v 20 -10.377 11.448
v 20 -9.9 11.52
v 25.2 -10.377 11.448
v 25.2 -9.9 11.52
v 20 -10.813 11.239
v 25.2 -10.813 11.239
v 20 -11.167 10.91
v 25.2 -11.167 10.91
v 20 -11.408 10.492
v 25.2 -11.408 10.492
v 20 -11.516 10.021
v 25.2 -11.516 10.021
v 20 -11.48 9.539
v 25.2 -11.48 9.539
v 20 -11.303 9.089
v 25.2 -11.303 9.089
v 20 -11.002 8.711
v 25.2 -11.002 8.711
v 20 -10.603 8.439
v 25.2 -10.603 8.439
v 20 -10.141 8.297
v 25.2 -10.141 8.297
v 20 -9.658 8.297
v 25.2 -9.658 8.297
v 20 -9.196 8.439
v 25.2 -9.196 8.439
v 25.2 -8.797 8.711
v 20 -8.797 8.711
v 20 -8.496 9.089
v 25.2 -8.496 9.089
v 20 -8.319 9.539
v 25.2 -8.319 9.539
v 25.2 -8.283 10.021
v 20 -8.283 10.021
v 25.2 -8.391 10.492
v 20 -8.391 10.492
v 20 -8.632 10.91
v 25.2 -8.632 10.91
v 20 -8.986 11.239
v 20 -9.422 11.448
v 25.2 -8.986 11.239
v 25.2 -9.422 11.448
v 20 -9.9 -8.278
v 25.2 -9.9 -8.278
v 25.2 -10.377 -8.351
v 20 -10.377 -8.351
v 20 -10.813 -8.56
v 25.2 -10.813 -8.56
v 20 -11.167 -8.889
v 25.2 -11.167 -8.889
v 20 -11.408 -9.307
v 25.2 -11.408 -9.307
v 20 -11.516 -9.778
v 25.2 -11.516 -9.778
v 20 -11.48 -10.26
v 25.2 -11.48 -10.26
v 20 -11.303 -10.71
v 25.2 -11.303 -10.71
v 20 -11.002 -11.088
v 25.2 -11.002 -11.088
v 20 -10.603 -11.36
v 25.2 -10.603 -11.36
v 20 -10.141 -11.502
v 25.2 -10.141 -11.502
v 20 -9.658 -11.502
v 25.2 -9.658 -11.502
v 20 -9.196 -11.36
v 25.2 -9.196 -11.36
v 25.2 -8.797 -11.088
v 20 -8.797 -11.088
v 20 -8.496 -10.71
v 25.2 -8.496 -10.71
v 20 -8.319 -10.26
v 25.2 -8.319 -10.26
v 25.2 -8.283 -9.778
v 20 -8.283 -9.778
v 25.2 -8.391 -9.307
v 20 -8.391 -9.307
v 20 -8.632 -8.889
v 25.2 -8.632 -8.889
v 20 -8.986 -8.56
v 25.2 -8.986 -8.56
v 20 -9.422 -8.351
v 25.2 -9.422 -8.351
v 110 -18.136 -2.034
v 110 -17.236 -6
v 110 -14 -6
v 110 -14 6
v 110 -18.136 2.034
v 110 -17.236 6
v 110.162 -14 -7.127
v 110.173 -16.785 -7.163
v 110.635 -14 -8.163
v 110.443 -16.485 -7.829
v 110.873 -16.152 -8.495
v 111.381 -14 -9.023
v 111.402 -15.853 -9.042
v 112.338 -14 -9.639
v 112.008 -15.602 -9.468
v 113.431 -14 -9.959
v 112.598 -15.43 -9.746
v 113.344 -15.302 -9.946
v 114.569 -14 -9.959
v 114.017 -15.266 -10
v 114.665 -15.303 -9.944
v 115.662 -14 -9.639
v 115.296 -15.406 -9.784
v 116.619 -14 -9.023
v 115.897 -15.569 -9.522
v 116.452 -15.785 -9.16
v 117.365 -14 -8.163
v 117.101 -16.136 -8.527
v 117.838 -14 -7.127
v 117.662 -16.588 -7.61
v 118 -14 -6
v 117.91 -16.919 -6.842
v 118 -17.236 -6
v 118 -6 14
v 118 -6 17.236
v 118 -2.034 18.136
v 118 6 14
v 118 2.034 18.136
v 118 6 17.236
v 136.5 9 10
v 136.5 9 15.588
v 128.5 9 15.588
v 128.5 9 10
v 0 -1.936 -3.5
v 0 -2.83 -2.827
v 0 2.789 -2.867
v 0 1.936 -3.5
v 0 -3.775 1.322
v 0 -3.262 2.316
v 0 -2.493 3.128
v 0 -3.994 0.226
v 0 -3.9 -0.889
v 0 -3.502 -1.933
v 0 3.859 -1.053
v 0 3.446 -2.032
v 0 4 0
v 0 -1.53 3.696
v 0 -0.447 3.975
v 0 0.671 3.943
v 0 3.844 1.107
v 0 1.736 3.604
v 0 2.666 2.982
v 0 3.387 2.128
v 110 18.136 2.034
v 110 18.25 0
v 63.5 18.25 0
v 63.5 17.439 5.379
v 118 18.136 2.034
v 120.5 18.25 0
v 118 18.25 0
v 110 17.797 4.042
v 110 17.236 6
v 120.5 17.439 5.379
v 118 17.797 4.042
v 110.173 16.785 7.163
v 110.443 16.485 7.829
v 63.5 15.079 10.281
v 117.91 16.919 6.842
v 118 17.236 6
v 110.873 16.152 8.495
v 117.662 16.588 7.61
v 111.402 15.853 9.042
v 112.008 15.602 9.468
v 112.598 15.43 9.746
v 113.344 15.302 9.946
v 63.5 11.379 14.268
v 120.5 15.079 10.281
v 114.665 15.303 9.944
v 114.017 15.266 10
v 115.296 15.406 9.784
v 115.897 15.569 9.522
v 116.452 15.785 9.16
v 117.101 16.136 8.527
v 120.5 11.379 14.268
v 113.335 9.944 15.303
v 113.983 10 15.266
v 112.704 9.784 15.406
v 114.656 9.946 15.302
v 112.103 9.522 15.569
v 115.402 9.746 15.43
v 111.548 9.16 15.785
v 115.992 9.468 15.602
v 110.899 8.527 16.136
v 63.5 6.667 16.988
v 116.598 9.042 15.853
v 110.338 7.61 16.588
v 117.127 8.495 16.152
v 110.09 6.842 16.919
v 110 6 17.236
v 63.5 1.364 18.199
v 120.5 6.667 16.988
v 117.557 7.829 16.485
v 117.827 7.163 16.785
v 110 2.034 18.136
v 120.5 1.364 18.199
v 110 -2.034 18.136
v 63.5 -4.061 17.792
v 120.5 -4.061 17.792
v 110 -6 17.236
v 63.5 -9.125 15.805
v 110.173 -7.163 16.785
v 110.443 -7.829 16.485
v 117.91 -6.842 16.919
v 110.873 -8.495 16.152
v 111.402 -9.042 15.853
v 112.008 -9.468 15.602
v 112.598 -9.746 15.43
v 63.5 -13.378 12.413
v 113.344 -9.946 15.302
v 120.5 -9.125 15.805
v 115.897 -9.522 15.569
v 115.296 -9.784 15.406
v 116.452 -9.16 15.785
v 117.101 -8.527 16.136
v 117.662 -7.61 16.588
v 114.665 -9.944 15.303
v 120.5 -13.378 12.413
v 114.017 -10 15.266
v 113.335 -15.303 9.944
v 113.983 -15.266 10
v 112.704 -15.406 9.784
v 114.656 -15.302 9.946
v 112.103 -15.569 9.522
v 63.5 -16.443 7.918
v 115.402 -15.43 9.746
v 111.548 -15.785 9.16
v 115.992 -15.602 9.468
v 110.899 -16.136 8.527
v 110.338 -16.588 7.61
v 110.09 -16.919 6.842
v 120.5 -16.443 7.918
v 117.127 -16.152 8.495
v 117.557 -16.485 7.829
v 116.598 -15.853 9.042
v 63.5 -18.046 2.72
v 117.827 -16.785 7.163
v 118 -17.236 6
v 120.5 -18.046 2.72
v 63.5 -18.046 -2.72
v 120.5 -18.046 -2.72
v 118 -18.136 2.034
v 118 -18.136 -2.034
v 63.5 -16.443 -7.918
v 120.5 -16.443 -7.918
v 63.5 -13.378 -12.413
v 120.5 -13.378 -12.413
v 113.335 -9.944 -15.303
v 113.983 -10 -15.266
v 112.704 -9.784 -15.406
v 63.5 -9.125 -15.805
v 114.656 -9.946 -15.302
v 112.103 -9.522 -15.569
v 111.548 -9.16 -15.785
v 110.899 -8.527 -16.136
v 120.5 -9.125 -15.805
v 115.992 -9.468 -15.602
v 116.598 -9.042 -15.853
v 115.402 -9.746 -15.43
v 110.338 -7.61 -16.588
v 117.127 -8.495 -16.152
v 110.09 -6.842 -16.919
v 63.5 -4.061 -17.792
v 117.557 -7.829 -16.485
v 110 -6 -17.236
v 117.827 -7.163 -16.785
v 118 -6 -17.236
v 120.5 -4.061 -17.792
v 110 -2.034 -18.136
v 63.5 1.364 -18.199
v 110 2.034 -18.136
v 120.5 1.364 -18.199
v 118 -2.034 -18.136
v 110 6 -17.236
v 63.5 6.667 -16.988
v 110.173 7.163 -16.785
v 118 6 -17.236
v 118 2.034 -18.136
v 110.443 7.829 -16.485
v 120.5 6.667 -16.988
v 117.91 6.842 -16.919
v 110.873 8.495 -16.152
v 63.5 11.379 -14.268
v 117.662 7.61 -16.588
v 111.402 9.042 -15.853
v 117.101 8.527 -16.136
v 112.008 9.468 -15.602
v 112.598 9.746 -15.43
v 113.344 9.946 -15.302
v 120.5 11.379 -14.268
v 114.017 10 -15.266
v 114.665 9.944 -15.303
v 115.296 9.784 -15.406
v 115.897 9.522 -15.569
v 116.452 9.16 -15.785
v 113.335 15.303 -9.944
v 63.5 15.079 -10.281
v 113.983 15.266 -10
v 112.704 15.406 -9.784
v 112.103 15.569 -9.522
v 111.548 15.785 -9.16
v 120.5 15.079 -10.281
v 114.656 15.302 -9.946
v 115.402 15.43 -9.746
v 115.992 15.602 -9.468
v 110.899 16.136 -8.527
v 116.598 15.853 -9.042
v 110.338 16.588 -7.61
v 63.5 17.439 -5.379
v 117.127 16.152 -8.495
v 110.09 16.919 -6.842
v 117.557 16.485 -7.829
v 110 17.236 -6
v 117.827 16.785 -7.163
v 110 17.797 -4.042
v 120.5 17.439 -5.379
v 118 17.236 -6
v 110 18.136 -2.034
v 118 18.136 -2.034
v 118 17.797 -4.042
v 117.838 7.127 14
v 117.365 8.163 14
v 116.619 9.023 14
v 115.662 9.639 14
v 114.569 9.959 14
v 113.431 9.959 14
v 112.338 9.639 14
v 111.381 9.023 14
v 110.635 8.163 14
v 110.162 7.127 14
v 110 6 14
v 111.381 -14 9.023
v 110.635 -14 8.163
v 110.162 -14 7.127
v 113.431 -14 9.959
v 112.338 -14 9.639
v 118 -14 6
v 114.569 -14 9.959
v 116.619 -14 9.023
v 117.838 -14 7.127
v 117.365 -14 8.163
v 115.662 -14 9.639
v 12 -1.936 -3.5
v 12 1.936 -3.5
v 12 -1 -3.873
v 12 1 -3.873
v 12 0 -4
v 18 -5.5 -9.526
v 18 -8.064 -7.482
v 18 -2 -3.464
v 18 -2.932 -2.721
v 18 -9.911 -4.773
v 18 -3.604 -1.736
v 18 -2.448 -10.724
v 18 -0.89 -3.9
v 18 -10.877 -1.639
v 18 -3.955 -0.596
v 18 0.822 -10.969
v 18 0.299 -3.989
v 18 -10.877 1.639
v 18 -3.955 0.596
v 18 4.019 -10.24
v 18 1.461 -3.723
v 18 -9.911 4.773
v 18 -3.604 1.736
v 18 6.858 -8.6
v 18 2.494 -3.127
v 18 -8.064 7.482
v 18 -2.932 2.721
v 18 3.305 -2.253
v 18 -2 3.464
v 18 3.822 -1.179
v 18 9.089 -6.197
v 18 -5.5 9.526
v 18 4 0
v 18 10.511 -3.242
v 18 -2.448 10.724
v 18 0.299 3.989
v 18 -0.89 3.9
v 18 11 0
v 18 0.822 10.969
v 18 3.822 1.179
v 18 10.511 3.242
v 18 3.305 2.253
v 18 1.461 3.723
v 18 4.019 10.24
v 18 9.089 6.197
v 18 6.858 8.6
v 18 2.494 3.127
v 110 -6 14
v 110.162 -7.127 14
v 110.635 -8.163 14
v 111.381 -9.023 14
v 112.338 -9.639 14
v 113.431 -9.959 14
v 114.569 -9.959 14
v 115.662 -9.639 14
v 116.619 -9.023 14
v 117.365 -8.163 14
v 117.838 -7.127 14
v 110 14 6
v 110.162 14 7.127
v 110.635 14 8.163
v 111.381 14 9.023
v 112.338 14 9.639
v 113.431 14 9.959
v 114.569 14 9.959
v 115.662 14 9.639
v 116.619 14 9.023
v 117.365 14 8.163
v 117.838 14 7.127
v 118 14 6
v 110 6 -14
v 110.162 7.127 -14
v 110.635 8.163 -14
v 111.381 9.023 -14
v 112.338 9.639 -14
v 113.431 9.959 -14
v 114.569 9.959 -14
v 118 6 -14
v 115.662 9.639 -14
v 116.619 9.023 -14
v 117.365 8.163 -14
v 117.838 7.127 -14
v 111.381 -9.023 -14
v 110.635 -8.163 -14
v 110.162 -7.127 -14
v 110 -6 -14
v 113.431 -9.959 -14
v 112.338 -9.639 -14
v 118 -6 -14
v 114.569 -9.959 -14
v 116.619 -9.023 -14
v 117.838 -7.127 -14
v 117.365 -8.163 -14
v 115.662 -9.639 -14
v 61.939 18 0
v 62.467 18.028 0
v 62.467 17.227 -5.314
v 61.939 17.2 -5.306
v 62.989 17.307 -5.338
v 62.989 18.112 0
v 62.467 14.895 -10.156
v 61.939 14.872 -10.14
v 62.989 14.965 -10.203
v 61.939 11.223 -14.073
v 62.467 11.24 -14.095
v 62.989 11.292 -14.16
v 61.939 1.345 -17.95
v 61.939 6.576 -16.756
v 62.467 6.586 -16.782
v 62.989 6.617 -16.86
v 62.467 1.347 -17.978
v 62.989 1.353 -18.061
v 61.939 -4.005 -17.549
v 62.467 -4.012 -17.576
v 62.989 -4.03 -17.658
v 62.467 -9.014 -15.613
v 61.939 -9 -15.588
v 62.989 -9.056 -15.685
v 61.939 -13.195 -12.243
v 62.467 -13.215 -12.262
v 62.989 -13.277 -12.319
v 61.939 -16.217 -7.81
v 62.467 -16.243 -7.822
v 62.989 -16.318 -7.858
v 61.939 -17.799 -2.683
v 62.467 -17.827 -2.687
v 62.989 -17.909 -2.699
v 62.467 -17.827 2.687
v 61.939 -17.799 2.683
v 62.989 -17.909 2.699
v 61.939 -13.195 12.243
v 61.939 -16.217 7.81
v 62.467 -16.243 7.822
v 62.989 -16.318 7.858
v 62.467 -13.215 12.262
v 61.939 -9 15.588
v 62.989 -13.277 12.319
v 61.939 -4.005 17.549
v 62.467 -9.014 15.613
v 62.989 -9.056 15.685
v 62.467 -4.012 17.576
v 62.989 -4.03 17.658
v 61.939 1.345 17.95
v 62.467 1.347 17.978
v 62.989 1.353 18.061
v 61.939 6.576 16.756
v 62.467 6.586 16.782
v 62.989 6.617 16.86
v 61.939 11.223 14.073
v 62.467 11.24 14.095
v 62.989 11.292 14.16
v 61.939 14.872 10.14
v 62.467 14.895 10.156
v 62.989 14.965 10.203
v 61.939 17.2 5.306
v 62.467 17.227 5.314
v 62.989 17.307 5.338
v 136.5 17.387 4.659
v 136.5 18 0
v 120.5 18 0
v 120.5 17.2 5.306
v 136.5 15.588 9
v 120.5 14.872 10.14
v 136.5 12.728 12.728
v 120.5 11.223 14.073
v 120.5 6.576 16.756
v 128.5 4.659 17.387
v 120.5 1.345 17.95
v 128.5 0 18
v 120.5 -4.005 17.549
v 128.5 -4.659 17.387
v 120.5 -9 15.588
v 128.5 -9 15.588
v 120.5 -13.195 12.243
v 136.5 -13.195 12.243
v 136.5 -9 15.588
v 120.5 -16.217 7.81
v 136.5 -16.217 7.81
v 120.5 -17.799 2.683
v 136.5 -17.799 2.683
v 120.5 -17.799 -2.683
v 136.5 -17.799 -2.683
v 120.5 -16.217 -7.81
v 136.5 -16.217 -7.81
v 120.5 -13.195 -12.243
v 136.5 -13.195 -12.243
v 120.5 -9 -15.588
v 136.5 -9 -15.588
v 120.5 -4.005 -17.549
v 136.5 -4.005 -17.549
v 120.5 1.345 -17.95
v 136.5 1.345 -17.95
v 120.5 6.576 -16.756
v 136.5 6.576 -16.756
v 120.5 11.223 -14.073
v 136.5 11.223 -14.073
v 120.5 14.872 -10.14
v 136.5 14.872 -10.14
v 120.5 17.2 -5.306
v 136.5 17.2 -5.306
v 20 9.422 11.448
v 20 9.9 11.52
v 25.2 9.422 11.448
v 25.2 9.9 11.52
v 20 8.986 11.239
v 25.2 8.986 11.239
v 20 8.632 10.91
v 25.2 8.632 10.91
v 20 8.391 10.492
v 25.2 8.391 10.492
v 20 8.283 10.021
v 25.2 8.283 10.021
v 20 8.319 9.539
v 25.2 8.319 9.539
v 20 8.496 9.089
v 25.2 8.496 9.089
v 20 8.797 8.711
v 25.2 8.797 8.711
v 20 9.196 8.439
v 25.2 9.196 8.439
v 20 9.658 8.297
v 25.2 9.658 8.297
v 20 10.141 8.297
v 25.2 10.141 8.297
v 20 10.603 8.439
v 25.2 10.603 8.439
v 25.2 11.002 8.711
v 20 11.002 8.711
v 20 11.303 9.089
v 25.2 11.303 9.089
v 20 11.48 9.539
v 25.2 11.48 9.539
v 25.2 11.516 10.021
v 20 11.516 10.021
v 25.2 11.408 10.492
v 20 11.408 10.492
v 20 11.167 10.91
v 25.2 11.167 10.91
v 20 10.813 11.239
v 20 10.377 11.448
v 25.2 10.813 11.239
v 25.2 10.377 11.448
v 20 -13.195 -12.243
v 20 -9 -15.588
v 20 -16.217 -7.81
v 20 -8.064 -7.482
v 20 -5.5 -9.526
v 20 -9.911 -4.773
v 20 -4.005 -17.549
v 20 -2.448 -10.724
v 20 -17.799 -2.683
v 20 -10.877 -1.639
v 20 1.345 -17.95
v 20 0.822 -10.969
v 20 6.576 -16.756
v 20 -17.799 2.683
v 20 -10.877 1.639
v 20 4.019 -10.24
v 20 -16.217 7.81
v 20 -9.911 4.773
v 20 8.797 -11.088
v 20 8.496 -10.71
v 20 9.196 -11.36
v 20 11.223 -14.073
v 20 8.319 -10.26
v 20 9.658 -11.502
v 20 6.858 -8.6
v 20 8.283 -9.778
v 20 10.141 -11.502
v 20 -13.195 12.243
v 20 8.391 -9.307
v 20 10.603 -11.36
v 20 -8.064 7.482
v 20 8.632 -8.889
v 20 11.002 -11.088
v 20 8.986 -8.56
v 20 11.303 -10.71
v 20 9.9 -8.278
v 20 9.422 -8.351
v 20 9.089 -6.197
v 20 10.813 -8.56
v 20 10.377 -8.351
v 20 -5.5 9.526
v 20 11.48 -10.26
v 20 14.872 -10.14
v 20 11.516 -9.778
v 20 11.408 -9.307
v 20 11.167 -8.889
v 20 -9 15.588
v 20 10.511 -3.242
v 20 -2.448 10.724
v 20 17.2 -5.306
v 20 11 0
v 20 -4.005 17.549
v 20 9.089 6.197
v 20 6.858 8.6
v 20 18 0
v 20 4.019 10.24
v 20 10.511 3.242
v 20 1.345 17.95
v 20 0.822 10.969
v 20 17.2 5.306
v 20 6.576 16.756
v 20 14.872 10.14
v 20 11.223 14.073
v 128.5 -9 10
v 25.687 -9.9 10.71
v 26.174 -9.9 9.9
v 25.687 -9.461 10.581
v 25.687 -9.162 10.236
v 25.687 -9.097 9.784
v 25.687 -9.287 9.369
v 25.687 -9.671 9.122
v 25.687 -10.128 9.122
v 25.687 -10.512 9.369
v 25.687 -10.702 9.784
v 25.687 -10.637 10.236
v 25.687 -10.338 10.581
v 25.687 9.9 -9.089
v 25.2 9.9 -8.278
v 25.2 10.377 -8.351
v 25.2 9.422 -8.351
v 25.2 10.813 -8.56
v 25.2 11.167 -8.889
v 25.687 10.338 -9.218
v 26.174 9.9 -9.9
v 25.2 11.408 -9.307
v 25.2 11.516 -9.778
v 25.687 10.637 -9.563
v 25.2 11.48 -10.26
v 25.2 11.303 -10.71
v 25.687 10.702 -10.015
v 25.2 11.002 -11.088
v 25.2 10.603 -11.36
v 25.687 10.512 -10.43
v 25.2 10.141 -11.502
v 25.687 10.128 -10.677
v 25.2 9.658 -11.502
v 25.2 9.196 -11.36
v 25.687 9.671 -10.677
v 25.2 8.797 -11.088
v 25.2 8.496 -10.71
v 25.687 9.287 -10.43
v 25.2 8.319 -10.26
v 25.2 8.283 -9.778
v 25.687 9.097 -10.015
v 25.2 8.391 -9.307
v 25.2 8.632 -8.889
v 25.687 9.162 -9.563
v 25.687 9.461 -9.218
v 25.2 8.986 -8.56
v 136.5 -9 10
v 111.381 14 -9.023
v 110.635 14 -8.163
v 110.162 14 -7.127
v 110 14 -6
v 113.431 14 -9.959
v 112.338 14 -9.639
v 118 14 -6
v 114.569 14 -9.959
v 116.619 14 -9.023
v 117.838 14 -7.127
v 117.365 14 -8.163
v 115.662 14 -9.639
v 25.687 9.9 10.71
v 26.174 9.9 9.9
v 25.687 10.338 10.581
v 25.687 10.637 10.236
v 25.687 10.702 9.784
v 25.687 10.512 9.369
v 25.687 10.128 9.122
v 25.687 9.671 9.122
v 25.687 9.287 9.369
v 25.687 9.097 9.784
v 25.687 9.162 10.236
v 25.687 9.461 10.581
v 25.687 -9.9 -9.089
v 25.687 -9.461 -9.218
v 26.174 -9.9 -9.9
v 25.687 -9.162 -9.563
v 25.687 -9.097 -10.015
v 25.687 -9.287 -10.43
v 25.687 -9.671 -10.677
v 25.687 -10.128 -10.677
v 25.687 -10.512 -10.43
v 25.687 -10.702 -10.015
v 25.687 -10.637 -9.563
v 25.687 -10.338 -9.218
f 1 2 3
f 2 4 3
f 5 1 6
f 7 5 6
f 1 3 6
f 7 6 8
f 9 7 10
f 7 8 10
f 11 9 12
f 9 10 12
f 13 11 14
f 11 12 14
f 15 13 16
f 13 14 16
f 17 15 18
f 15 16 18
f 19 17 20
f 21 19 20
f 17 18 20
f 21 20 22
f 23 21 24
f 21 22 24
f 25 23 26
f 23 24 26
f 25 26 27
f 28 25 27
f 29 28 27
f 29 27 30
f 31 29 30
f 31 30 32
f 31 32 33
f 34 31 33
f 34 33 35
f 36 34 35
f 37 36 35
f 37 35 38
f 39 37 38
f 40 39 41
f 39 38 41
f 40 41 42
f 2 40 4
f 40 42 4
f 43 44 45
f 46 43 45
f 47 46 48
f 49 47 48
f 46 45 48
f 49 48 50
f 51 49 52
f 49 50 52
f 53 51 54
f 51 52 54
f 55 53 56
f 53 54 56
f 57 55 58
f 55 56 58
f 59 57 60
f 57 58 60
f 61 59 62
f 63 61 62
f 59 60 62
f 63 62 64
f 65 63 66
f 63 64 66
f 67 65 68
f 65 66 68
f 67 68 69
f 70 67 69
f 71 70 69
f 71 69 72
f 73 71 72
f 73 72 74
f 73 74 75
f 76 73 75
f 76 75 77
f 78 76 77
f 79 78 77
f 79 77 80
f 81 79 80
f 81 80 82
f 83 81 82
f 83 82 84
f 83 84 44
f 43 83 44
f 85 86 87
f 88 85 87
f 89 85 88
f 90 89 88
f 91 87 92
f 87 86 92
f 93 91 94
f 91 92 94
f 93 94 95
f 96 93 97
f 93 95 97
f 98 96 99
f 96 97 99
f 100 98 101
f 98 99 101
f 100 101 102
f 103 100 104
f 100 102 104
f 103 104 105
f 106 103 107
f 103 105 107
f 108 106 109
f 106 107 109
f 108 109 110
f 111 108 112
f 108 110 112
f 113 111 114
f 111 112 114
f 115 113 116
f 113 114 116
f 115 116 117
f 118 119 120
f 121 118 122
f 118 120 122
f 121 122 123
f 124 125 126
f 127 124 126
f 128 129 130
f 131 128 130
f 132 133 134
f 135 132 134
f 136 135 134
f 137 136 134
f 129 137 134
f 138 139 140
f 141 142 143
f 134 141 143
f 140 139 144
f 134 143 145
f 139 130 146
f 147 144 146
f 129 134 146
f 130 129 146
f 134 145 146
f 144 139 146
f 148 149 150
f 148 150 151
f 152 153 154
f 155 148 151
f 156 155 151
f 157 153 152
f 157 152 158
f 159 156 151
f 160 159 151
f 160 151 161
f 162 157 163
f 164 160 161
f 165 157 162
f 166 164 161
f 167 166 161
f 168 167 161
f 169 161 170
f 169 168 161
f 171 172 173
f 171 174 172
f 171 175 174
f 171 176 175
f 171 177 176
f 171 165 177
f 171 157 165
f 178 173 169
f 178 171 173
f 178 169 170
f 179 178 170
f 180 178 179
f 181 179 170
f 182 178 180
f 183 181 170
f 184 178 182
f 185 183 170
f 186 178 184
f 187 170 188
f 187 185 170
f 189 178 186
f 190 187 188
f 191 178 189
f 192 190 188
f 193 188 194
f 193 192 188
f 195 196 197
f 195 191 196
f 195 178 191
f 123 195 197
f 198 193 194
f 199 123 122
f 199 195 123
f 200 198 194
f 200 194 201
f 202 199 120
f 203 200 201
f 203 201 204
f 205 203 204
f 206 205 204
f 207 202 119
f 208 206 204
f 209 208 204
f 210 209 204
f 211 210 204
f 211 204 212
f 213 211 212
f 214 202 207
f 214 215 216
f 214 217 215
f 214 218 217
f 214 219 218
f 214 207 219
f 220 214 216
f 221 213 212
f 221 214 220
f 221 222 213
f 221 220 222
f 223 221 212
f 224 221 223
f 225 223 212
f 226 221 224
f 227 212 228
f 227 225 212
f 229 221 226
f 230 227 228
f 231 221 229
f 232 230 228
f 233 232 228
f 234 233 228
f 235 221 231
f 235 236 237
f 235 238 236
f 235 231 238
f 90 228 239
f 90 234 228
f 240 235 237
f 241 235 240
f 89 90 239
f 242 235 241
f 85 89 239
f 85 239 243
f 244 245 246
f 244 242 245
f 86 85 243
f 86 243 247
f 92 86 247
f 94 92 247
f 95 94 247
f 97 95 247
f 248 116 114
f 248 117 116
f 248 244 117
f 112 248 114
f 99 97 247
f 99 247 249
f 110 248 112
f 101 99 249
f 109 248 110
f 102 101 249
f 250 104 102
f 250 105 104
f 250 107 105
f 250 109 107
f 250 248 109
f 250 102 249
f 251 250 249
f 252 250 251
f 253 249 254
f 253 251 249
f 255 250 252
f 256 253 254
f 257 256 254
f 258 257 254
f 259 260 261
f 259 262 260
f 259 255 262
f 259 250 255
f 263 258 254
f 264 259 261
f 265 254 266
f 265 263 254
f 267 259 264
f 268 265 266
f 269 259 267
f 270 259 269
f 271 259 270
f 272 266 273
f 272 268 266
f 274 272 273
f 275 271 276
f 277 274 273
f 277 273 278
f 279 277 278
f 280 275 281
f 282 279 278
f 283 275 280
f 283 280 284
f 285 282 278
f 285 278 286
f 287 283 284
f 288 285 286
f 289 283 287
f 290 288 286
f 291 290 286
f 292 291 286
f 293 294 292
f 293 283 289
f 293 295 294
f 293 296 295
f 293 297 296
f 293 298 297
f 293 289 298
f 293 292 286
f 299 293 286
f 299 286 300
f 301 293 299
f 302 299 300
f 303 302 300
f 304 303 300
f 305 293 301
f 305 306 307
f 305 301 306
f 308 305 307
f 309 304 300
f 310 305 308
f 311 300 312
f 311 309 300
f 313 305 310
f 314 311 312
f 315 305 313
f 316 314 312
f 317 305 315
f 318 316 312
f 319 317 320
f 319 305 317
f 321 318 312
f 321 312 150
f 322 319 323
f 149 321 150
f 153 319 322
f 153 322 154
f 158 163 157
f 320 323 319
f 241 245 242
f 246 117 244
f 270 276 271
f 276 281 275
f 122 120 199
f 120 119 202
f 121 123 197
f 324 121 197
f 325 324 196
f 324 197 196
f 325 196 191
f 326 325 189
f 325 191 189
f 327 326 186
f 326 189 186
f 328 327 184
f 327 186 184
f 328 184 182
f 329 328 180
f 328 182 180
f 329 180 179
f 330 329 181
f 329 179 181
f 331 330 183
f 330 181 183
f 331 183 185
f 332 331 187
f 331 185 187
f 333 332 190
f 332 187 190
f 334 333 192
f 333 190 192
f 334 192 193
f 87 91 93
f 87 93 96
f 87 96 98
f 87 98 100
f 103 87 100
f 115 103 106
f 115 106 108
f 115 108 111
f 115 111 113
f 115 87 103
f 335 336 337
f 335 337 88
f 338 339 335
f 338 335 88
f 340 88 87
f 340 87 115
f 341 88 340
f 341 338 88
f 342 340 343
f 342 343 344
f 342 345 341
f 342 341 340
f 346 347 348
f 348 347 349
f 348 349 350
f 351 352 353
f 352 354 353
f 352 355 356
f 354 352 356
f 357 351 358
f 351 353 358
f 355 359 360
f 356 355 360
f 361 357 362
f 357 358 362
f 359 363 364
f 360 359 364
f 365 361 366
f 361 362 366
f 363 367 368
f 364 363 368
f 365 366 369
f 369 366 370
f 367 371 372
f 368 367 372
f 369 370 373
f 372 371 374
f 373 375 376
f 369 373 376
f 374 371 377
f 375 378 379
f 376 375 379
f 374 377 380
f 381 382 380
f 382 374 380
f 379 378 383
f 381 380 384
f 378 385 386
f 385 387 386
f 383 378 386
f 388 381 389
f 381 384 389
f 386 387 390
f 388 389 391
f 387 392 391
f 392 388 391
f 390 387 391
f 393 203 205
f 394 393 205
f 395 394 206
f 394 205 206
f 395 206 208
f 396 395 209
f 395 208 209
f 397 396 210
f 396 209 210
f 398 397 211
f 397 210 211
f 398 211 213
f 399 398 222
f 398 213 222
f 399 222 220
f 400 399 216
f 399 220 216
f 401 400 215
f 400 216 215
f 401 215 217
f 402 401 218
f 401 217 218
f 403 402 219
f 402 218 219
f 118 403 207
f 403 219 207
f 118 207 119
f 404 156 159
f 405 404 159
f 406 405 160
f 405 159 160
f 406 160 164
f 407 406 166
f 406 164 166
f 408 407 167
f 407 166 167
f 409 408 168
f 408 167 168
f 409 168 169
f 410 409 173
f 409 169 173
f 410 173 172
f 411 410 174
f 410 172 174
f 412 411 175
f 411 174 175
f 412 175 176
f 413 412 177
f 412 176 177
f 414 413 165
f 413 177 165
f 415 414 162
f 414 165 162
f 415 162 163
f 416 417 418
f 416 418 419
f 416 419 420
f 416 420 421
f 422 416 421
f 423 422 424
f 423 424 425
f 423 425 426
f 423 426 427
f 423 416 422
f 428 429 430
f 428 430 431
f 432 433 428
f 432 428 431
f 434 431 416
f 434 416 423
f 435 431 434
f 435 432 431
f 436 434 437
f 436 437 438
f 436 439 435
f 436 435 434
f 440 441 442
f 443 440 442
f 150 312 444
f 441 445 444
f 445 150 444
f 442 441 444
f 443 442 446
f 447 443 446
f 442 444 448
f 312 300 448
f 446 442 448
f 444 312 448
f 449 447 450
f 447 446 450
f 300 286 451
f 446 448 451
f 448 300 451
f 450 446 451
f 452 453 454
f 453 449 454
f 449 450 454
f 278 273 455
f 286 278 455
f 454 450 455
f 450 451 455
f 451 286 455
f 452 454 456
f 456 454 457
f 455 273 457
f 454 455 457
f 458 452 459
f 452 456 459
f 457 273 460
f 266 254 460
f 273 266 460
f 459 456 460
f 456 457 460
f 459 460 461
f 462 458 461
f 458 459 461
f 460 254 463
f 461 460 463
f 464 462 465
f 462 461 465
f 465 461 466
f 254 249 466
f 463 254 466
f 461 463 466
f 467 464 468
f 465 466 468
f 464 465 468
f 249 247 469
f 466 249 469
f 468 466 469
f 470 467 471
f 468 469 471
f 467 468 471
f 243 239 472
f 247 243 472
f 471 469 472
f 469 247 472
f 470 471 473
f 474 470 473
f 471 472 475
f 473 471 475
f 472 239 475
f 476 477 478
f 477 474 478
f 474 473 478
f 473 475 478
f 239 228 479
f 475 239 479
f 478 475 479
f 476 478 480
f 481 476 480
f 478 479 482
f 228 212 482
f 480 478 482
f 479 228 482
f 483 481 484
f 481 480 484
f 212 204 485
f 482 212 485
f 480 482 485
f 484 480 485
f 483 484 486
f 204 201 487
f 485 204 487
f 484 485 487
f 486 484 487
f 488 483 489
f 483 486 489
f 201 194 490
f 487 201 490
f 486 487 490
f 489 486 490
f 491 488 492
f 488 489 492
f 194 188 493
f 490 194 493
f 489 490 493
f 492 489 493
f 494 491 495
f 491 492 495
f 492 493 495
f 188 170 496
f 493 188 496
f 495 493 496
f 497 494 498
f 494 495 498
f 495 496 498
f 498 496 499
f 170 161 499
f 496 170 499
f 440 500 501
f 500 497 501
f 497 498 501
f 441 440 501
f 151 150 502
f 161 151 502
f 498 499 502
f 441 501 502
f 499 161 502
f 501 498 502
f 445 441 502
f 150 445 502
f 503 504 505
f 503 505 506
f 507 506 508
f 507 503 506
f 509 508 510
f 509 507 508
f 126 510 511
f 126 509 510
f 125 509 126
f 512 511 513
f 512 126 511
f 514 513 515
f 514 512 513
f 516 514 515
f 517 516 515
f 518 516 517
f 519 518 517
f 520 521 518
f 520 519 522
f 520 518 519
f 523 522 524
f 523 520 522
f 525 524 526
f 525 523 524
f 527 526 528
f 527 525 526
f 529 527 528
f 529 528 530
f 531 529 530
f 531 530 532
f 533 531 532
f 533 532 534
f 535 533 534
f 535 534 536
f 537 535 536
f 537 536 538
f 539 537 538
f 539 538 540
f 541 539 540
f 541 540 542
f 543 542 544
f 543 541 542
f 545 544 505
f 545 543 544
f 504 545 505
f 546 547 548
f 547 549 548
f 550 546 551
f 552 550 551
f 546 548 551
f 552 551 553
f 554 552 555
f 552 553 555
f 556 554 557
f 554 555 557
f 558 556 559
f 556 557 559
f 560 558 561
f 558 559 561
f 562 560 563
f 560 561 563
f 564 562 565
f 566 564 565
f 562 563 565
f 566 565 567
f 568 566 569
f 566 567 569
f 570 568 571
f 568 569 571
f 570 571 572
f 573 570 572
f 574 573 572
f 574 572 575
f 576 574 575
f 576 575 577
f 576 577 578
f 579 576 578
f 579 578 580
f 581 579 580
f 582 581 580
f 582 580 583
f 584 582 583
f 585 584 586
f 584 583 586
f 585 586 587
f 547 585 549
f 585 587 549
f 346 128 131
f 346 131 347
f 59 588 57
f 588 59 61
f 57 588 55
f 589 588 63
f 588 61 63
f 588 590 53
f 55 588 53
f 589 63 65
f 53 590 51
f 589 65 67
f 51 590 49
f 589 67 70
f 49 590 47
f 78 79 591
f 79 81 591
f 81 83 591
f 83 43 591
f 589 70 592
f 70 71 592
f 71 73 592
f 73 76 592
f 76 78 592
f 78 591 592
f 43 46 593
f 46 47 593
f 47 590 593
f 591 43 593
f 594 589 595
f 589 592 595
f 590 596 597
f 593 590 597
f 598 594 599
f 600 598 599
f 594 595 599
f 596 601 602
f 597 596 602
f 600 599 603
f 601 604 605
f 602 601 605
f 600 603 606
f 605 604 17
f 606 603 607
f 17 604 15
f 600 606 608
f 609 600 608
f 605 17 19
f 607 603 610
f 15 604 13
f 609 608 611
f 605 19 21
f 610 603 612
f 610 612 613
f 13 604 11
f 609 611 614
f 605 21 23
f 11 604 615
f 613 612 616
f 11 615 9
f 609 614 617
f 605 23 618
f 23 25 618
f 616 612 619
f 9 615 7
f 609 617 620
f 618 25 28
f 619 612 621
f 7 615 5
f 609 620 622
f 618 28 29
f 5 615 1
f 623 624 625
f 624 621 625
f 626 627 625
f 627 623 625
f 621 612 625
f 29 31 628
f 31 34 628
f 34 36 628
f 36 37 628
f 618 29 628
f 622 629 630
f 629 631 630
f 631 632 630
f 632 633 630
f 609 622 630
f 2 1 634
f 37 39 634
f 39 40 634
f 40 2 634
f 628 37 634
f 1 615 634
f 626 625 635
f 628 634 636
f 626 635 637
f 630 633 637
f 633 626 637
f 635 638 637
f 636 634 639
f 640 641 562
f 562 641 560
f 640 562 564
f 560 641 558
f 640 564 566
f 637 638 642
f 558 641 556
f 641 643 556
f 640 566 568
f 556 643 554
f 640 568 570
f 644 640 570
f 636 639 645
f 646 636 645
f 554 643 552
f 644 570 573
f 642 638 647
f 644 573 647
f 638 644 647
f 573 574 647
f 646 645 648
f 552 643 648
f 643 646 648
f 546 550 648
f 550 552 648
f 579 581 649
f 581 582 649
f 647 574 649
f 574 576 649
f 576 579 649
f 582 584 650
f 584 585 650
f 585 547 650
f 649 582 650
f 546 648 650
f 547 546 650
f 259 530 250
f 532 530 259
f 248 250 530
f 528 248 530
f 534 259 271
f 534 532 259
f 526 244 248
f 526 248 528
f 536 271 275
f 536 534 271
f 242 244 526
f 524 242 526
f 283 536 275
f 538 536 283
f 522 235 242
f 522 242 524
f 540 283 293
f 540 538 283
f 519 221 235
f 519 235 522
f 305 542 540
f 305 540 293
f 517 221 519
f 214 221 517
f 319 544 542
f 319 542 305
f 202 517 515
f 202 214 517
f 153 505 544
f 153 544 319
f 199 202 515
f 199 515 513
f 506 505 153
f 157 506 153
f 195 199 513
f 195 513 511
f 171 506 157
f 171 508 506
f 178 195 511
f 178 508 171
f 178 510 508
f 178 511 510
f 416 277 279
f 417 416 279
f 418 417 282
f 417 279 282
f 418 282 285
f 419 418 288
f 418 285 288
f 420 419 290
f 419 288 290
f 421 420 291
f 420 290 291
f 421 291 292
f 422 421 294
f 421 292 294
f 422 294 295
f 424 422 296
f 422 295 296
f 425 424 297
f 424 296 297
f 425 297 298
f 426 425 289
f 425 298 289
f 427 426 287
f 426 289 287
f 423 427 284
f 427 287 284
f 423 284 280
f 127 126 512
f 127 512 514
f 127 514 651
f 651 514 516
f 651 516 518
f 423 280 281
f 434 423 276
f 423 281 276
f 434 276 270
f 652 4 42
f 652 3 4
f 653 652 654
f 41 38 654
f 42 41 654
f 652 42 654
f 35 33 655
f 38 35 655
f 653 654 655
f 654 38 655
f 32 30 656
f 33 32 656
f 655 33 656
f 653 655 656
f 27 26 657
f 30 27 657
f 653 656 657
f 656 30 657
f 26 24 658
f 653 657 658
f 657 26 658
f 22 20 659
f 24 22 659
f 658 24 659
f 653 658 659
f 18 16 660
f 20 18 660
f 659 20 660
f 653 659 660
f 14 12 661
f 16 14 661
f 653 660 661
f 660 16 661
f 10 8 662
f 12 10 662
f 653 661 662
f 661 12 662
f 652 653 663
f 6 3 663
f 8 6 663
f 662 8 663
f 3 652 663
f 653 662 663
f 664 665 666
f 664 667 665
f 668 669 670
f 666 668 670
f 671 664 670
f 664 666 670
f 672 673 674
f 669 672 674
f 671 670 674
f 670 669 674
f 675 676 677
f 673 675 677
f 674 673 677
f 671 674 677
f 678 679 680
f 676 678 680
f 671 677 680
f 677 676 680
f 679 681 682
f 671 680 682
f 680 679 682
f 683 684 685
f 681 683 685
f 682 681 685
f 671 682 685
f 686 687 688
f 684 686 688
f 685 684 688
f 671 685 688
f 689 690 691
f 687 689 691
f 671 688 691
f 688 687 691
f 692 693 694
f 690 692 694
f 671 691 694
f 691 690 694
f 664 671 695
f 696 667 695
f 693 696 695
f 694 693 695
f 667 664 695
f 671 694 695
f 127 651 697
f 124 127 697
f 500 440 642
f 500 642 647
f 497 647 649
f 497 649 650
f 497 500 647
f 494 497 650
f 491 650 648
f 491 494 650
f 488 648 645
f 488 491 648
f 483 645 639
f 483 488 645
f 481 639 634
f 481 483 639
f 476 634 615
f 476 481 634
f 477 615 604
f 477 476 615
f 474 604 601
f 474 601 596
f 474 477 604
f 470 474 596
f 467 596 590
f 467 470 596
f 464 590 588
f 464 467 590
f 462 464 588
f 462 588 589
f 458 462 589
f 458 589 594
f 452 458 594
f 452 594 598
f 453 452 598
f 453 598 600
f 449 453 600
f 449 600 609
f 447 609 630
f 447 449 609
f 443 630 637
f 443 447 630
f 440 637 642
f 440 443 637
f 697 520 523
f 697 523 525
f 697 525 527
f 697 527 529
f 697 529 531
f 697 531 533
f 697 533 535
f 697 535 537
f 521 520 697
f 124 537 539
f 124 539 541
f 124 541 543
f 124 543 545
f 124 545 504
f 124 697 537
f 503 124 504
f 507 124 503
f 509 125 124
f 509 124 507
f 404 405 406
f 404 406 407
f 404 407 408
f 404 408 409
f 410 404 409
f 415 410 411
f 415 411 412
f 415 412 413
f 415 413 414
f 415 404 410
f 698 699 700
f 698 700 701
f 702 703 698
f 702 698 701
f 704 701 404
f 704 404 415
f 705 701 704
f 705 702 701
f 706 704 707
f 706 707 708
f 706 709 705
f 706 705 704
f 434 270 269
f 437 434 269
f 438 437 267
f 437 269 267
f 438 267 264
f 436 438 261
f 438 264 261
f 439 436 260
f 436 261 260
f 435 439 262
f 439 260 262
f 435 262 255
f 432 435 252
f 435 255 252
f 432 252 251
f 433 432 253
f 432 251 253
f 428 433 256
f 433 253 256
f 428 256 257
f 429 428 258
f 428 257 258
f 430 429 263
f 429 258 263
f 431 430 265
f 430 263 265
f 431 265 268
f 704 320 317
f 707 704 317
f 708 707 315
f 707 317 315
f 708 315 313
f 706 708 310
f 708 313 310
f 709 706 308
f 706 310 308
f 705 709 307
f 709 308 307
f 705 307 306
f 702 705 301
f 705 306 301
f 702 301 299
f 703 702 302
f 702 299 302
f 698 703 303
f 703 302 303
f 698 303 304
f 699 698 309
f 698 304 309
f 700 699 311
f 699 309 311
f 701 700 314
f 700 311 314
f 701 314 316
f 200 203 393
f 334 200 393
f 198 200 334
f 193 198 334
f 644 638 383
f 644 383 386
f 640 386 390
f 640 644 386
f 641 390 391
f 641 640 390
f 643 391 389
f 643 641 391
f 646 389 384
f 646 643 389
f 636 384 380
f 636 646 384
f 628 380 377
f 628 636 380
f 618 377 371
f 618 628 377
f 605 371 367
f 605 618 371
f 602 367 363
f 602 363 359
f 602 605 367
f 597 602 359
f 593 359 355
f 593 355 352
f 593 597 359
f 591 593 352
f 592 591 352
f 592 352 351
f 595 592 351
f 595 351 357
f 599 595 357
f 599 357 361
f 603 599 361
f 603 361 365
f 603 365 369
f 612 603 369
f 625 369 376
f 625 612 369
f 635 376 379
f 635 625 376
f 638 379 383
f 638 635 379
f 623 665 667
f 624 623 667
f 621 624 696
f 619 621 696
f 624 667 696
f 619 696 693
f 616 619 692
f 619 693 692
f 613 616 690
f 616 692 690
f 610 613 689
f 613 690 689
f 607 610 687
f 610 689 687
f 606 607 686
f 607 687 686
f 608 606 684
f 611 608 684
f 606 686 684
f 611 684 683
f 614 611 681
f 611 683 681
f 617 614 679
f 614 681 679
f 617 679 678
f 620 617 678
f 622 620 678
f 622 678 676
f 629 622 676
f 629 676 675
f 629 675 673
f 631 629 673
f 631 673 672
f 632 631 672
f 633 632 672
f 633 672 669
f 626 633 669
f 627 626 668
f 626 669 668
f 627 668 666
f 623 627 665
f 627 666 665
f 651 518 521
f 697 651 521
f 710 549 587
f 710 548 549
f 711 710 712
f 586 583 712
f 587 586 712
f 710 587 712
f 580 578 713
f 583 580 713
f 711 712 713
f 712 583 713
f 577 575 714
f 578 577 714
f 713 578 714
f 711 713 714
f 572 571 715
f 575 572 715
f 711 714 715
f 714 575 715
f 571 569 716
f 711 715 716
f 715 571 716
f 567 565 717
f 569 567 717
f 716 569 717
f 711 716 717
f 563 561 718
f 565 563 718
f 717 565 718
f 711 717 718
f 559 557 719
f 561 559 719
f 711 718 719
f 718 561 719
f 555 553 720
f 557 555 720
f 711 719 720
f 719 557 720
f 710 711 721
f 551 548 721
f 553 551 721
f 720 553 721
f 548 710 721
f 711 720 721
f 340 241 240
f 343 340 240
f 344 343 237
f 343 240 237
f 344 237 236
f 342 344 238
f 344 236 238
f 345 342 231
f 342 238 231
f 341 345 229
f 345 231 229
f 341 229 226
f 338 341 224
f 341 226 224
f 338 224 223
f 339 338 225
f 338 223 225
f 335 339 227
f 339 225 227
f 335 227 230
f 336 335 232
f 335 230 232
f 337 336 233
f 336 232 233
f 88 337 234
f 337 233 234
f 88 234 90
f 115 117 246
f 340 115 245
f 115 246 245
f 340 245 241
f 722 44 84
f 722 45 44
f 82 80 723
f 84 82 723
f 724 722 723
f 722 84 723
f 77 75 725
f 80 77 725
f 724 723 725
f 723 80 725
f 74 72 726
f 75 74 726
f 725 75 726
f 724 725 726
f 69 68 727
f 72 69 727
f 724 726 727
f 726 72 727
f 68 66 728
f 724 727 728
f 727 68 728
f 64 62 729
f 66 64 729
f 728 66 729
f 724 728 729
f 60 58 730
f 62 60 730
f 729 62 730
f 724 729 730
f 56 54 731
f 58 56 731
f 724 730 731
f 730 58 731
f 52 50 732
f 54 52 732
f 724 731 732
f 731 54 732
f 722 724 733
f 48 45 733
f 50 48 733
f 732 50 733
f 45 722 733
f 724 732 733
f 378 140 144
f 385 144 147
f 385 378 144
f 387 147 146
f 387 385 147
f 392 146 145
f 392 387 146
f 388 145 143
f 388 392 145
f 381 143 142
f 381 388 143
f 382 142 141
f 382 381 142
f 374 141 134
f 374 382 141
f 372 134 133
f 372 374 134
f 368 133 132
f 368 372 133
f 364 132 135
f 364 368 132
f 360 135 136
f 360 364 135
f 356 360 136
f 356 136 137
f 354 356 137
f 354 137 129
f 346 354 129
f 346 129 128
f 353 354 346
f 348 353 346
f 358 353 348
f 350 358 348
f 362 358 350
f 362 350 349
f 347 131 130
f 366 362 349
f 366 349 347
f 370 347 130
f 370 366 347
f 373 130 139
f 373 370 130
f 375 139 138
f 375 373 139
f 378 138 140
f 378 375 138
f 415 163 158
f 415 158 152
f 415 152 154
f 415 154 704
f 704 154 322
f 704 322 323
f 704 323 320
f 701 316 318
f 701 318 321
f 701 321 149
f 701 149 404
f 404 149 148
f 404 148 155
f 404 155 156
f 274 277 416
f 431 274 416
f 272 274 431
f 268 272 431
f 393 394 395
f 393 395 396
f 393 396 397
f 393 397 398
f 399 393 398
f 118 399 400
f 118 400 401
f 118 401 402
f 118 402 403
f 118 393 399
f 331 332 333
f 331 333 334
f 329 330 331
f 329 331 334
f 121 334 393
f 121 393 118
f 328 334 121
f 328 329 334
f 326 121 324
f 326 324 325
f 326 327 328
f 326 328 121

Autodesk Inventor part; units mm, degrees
ref_plane "YZ Plane" through (0, 0, 0) normal (1, 0, 0) x (0, 1, 0)
ref_plane "XZ Plane" through (0, 0, 0) normal (0, 1, 0) x (-1, 0, 0)
sketch "Эскиз1" plane through (0, 0, 0) normal (0, 0, 1) x (1, 0, 0)
  line L0 (0, 0) -> (0, 4)
  line L1 (0, 4) -> (18, 4)
  line L2 (18, 4) -> (18, 11)
  line L3 (18, 11) -> (20, 11)
  line L4 (20, 11) -> (20, 18)
  line L5 (20, 18) -> (63.5, 18)
  line L6 (63.5, 18.25) -> (120.5, 18.25)
  line L7 (120.5, 18.25) -> (120.5, 18)
  line L8 (120.5, 18) -> (136.5, 18)
  line L9 (136.5, 18) -> (136.5, 0)
  line L10 (0, 0) -> (136.5, 0)
  line L11 (63.5, 18) -> (63.5, 18.25)
  point P0 (63, 17.5)
  point P1 (63, 17.5)
  dimension "d5" = 20
  dimension "d6" = 2
  dimension "d7" = 8
  dimension "d8" = 22
  dimension "d9" = 36
  dimension "d11" = 36.5
  dimension "d12" = 43.5
  dimension "d14" = 57
  dimension "d15" = 16
revolve "Вращение1" add sketch "Эскиз1" angle 360 about axis through (0, 0, 0) along (1, 0, 0)
fillet "Сопряжение1" radius 5 1 edges at (63.5, -18, 0)
sketch "Эскиз2" plane through (0, 0, 0) normal (0, 1, 0) x (-1, 0, 0)
  line L0 (0, 4) -> (0, -4) projected
  line L1 (0, -3.5) -> (-12, -3.5)
  line L2 (-12, -3.5) -> (-12, -6.5419)
  line L3 (-12, -6.5419) -> (0, -6.5419)
  line L4 (0, -3.1455) -> (0, -6.5419)
  point P0 (0, 0)
  point P1 (0, 0)
  dimension "d20" = 3.5
  dimension "d21" = 12
extrude "Выдавливание1" cut sketch "Эскиз2" along normal mid plane 10
ref_plane "РабПлоскость1" through (0, 0, 22) normal (0, 0, 1) x (1, 0, 0)
sketch "Эскиз3" plane through (0, 0, 22) normal (0, 0, 1) x (1, 0, 0)
  line L0 (110, 0) -> (110, -6)
  line L1 (118, -6) -> (118, 0)
  arc A0 (110, -6) -> (118, -6) centre (114, -6) ccw
  line L2 (110, 0) -> (118, 0) construction
  line L3 (110, 0) -> (110, 6)
  line L4 (118, 6) -> (118, 0)
  arc A1 (118, 6) -> (110, 6) centre (114, 6) ccw
  point P0 (0, 0)
  dimension "d23" = 12
  dimension "d24" = 8
  dimension "d25" = 110
extrude "Выдавливание2" cut sketch "Эскиз3" against normal blind 8
pattern_circular "Круговой массив1" count 4 over 360 about axis through (92, 0, 0) along (1, 0, 0) of "Выдавливание2"
sketch "Эскиз4" plane through (0, 0, 22) normal (0, 0, 1) x (1, 0, 0)
  line L0 (148, 9) -> (128.5, 9)
  line L1 (128.5, 9) -> (128.5, -9)
  line L2 (128.5, -9) -> (136.5, -9)
  line L3 (136.5, -18) -> (136.5, 18) projected
  point P0 (0, 0)
  point P1 (136.5, 9)
  dimension "d31" = 8
  dimension "d32" = 18
  dimension "d33" = 9
extrude "Выдавливание3" cut sketch "Эскиз4" against normal blind 12
sketch "Эскиз5" plane through (20, 0, 0) normal (-1, 0, 0) x (0, 0, 1)
  arc A0 (-3.5, -1.9365) -> (-3.5, 1.9365) centre (0, 0) ccw projected
  circle A1 centre (0, 0) radius 14
  line L0 (0, 0) -> (0, -31.2) construction
  line L1 (0, 0) -> (9.8995, -9.8995) construction
  point P0 (9.8995, 9.8995)
  point P1 (-9.8995, 9.8995)
  point P2 (-9.8995, -9.8995)
  dimension "d43" = 28
  dimension "d44" = 45
  dimension "d47" = 360
hole "Отверстие1" at (20, -9.8995, 9.8995) at (20, 9.8995, 9.8995) at (20, 9.8995, -9.8995) at (20, -9.8995, -9.8995) direction (1, 0, 0) diameter 3.242 depth 5.2 tip angle 118 thread size "M4x0.7" class "6H" standard "ISO Metric profile"
properties part number "CHP-42GP-775 ABHL" material "Алюминий 6061-AHC"
